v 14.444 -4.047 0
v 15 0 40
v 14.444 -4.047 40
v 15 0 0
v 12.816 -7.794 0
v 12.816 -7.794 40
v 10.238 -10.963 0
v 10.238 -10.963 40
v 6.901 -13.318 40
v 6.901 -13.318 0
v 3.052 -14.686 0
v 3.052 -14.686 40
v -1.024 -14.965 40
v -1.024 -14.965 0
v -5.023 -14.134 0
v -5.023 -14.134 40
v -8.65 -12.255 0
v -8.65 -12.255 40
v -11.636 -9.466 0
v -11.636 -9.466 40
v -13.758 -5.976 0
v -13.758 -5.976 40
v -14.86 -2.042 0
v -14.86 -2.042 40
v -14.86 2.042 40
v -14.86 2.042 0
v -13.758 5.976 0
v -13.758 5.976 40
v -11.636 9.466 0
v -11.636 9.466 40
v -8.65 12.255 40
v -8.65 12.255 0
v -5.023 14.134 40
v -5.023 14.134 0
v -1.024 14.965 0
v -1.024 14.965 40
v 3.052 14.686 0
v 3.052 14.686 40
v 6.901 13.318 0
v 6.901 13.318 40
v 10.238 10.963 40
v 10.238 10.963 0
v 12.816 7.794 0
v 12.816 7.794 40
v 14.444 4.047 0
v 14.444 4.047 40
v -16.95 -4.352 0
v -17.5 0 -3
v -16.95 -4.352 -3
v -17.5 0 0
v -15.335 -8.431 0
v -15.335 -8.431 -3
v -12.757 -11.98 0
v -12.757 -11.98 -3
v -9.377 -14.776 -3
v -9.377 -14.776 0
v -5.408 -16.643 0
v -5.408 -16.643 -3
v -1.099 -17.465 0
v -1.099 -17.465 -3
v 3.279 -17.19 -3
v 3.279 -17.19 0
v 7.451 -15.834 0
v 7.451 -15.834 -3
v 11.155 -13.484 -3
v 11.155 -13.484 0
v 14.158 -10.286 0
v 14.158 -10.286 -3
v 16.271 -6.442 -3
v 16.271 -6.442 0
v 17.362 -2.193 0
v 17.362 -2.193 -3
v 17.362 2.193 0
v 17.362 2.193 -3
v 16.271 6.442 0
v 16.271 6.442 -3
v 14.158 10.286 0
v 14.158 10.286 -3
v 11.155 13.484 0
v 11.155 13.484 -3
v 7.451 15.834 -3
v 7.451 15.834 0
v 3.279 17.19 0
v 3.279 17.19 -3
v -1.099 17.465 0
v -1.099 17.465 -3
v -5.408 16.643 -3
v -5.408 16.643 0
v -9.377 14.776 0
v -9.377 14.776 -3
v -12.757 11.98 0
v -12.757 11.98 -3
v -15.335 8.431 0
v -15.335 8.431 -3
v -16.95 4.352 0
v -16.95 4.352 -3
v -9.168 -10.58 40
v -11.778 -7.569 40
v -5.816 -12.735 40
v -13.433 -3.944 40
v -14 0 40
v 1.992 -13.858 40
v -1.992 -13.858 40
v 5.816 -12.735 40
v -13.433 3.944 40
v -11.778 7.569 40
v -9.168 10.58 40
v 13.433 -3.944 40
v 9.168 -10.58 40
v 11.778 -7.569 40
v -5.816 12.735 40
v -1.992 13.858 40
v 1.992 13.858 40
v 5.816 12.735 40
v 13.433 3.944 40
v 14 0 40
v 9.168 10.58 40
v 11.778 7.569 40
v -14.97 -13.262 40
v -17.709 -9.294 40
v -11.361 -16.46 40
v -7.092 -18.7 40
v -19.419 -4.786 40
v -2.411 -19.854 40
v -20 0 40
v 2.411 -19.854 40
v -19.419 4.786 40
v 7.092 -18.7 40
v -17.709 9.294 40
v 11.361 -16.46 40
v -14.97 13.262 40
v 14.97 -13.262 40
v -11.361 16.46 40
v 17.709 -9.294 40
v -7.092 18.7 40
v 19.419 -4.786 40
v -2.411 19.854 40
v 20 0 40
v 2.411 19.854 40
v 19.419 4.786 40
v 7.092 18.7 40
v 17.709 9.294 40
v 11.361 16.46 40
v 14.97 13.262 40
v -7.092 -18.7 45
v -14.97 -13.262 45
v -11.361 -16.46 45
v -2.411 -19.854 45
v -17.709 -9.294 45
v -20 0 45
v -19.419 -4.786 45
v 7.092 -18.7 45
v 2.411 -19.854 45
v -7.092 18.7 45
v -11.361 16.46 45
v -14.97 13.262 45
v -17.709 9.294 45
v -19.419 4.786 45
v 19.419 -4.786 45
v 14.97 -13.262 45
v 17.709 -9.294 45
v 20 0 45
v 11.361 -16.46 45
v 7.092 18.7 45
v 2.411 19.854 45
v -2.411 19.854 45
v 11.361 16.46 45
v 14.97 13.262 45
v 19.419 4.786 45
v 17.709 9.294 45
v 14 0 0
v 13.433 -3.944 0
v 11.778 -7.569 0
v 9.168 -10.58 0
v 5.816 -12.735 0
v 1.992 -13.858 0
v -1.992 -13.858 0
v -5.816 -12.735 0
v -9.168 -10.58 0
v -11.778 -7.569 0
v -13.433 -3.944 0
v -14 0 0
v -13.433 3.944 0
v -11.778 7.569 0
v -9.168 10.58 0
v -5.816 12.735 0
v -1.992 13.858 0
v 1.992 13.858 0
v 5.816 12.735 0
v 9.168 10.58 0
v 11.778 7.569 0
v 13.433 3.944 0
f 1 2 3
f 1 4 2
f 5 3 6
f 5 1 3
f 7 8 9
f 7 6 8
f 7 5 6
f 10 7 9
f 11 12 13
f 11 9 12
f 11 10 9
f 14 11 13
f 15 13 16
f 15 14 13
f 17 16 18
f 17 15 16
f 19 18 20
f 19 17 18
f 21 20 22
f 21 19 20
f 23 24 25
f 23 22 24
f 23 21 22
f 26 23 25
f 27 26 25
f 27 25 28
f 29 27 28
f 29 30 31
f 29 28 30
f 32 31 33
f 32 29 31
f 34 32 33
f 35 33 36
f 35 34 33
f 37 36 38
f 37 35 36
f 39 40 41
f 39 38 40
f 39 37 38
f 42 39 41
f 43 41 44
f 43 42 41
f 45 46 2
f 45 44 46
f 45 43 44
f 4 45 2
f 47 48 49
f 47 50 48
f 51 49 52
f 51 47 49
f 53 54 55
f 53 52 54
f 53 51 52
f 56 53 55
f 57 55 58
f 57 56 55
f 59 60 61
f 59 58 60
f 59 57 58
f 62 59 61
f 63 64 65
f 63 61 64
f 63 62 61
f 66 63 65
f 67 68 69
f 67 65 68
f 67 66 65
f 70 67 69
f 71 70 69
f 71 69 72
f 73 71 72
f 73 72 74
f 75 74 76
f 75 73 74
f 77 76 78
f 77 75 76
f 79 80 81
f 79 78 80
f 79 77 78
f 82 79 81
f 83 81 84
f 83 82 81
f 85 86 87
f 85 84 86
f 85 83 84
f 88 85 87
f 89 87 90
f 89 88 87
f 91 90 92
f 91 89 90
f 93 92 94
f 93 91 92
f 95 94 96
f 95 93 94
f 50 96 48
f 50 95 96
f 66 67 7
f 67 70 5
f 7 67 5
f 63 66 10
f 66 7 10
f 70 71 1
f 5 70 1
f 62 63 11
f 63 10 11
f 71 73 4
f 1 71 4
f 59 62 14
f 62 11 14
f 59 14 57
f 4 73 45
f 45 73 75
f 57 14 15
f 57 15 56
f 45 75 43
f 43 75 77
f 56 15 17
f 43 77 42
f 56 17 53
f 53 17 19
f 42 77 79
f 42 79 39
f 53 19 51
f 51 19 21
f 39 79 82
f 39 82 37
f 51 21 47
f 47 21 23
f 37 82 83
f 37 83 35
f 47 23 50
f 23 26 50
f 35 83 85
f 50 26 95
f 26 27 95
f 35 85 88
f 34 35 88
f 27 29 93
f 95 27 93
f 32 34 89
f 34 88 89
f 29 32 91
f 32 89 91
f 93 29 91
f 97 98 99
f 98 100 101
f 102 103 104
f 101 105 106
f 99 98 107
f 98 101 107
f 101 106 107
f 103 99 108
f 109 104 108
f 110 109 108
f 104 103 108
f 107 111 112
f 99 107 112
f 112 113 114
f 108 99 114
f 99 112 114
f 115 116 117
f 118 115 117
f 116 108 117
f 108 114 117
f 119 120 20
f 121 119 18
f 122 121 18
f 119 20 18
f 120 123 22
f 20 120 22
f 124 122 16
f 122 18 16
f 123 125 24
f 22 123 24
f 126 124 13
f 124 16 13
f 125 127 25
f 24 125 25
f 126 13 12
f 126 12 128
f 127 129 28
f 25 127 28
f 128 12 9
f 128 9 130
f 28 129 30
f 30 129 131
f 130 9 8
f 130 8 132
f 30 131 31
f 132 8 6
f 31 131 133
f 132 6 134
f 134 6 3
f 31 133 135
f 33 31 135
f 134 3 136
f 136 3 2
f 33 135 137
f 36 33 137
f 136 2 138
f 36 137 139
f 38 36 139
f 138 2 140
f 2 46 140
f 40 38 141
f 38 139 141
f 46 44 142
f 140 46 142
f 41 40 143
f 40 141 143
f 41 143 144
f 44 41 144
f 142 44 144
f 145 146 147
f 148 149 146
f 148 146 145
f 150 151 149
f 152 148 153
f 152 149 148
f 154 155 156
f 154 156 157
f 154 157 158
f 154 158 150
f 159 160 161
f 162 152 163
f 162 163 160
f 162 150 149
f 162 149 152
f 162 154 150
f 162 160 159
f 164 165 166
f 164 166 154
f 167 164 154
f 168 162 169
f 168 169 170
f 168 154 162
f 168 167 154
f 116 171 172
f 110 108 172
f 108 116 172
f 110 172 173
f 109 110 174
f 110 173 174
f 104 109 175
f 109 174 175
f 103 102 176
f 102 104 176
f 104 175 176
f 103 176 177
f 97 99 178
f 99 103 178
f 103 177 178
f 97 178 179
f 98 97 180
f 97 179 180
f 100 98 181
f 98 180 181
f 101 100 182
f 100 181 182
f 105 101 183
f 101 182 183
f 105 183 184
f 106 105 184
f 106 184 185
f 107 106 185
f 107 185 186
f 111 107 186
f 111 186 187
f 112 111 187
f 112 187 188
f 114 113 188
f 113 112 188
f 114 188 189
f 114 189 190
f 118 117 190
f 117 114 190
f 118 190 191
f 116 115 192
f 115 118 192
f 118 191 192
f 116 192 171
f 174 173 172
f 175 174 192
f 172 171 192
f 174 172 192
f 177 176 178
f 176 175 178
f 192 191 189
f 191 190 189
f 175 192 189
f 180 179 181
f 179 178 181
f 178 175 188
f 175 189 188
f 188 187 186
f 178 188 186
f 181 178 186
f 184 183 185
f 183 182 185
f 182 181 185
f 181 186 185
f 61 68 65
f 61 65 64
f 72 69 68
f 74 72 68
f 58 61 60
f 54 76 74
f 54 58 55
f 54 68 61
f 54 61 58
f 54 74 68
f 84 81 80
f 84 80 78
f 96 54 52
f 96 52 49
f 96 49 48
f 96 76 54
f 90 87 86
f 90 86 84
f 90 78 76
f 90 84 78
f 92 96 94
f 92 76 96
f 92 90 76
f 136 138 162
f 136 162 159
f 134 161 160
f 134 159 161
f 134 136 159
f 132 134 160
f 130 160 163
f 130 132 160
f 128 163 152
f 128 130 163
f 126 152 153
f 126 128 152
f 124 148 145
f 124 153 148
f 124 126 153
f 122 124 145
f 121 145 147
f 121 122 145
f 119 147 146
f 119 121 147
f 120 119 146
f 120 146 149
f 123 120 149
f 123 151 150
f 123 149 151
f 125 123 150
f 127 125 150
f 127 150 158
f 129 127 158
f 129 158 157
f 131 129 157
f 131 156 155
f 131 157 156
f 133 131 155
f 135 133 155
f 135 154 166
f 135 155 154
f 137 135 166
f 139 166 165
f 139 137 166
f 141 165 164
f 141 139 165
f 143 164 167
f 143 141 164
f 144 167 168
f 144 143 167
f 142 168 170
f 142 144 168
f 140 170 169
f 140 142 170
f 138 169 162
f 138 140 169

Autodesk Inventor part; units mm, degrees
ref_plane "YZ Plane" through (0, 0, 0) normal (1, 0, 0) x (0, 1, 0)
ref_plane "XZ Plane" through (0, 0, 0) normal (0, 1, 0) x (-1, 0, 0)
ref_plane "XY Plane" through (0, 0, 0) normal (0, 0, 1) x (1, 0, 0)
sketch "Sketch1" plane through (0, 0, 0) normal (0, 0, 1) x (1, 0, 0)
  circle A0 centre (0, 0) radius 20
  circle A1 centre (0, 0) radius 15
  circle A2 centre (0, 0) radius 13
  circle A3 centre (0, 0) radius 14
  dimension "d0" = 40
  dimension "d1" = 5
  dimension "d2" = 2
  dimension "d3" = 1
extrude "Extrusion1" add sketch "Sketch1" along normal blind 40 contours A1
sketch "Sketch2" plane through (0, 0, 40) normal (0, 0, 1) x (1, 0, 0)
  point P0 (0, 0)
sketch "Sketch3" plane through (0, 0, 40) normal (0, 0, 1) x (1, 0, 0)
  circle A0 centre (0, 0) radius 20
  dimension "d6" = 40
extrude "Extrusion2" add sketch "Sketch3" along normal blind 5
sketch "Sketch4" plane through (0, 0, 0) normal (0, 0, -1) x (-1, 0, 0)
  circle A0 centre (0, 0) radius 17.5
  dimension "d9" = 35
extrude "Extrusion3" add sketch "Sketch4" along normal blind 3
sketch "Sketch5" plane through (0, 0, 45) normal (0, 0, 1) x (1, 0, 0)
  point P0 (0, 0)
sketch "Sketch6" plane through (0, 0, 45) normal (0, 0, 1) x (1, 0, 0)
  circle A0 centre (0, 0) radius 15
properties part number "weird_cylinder"
